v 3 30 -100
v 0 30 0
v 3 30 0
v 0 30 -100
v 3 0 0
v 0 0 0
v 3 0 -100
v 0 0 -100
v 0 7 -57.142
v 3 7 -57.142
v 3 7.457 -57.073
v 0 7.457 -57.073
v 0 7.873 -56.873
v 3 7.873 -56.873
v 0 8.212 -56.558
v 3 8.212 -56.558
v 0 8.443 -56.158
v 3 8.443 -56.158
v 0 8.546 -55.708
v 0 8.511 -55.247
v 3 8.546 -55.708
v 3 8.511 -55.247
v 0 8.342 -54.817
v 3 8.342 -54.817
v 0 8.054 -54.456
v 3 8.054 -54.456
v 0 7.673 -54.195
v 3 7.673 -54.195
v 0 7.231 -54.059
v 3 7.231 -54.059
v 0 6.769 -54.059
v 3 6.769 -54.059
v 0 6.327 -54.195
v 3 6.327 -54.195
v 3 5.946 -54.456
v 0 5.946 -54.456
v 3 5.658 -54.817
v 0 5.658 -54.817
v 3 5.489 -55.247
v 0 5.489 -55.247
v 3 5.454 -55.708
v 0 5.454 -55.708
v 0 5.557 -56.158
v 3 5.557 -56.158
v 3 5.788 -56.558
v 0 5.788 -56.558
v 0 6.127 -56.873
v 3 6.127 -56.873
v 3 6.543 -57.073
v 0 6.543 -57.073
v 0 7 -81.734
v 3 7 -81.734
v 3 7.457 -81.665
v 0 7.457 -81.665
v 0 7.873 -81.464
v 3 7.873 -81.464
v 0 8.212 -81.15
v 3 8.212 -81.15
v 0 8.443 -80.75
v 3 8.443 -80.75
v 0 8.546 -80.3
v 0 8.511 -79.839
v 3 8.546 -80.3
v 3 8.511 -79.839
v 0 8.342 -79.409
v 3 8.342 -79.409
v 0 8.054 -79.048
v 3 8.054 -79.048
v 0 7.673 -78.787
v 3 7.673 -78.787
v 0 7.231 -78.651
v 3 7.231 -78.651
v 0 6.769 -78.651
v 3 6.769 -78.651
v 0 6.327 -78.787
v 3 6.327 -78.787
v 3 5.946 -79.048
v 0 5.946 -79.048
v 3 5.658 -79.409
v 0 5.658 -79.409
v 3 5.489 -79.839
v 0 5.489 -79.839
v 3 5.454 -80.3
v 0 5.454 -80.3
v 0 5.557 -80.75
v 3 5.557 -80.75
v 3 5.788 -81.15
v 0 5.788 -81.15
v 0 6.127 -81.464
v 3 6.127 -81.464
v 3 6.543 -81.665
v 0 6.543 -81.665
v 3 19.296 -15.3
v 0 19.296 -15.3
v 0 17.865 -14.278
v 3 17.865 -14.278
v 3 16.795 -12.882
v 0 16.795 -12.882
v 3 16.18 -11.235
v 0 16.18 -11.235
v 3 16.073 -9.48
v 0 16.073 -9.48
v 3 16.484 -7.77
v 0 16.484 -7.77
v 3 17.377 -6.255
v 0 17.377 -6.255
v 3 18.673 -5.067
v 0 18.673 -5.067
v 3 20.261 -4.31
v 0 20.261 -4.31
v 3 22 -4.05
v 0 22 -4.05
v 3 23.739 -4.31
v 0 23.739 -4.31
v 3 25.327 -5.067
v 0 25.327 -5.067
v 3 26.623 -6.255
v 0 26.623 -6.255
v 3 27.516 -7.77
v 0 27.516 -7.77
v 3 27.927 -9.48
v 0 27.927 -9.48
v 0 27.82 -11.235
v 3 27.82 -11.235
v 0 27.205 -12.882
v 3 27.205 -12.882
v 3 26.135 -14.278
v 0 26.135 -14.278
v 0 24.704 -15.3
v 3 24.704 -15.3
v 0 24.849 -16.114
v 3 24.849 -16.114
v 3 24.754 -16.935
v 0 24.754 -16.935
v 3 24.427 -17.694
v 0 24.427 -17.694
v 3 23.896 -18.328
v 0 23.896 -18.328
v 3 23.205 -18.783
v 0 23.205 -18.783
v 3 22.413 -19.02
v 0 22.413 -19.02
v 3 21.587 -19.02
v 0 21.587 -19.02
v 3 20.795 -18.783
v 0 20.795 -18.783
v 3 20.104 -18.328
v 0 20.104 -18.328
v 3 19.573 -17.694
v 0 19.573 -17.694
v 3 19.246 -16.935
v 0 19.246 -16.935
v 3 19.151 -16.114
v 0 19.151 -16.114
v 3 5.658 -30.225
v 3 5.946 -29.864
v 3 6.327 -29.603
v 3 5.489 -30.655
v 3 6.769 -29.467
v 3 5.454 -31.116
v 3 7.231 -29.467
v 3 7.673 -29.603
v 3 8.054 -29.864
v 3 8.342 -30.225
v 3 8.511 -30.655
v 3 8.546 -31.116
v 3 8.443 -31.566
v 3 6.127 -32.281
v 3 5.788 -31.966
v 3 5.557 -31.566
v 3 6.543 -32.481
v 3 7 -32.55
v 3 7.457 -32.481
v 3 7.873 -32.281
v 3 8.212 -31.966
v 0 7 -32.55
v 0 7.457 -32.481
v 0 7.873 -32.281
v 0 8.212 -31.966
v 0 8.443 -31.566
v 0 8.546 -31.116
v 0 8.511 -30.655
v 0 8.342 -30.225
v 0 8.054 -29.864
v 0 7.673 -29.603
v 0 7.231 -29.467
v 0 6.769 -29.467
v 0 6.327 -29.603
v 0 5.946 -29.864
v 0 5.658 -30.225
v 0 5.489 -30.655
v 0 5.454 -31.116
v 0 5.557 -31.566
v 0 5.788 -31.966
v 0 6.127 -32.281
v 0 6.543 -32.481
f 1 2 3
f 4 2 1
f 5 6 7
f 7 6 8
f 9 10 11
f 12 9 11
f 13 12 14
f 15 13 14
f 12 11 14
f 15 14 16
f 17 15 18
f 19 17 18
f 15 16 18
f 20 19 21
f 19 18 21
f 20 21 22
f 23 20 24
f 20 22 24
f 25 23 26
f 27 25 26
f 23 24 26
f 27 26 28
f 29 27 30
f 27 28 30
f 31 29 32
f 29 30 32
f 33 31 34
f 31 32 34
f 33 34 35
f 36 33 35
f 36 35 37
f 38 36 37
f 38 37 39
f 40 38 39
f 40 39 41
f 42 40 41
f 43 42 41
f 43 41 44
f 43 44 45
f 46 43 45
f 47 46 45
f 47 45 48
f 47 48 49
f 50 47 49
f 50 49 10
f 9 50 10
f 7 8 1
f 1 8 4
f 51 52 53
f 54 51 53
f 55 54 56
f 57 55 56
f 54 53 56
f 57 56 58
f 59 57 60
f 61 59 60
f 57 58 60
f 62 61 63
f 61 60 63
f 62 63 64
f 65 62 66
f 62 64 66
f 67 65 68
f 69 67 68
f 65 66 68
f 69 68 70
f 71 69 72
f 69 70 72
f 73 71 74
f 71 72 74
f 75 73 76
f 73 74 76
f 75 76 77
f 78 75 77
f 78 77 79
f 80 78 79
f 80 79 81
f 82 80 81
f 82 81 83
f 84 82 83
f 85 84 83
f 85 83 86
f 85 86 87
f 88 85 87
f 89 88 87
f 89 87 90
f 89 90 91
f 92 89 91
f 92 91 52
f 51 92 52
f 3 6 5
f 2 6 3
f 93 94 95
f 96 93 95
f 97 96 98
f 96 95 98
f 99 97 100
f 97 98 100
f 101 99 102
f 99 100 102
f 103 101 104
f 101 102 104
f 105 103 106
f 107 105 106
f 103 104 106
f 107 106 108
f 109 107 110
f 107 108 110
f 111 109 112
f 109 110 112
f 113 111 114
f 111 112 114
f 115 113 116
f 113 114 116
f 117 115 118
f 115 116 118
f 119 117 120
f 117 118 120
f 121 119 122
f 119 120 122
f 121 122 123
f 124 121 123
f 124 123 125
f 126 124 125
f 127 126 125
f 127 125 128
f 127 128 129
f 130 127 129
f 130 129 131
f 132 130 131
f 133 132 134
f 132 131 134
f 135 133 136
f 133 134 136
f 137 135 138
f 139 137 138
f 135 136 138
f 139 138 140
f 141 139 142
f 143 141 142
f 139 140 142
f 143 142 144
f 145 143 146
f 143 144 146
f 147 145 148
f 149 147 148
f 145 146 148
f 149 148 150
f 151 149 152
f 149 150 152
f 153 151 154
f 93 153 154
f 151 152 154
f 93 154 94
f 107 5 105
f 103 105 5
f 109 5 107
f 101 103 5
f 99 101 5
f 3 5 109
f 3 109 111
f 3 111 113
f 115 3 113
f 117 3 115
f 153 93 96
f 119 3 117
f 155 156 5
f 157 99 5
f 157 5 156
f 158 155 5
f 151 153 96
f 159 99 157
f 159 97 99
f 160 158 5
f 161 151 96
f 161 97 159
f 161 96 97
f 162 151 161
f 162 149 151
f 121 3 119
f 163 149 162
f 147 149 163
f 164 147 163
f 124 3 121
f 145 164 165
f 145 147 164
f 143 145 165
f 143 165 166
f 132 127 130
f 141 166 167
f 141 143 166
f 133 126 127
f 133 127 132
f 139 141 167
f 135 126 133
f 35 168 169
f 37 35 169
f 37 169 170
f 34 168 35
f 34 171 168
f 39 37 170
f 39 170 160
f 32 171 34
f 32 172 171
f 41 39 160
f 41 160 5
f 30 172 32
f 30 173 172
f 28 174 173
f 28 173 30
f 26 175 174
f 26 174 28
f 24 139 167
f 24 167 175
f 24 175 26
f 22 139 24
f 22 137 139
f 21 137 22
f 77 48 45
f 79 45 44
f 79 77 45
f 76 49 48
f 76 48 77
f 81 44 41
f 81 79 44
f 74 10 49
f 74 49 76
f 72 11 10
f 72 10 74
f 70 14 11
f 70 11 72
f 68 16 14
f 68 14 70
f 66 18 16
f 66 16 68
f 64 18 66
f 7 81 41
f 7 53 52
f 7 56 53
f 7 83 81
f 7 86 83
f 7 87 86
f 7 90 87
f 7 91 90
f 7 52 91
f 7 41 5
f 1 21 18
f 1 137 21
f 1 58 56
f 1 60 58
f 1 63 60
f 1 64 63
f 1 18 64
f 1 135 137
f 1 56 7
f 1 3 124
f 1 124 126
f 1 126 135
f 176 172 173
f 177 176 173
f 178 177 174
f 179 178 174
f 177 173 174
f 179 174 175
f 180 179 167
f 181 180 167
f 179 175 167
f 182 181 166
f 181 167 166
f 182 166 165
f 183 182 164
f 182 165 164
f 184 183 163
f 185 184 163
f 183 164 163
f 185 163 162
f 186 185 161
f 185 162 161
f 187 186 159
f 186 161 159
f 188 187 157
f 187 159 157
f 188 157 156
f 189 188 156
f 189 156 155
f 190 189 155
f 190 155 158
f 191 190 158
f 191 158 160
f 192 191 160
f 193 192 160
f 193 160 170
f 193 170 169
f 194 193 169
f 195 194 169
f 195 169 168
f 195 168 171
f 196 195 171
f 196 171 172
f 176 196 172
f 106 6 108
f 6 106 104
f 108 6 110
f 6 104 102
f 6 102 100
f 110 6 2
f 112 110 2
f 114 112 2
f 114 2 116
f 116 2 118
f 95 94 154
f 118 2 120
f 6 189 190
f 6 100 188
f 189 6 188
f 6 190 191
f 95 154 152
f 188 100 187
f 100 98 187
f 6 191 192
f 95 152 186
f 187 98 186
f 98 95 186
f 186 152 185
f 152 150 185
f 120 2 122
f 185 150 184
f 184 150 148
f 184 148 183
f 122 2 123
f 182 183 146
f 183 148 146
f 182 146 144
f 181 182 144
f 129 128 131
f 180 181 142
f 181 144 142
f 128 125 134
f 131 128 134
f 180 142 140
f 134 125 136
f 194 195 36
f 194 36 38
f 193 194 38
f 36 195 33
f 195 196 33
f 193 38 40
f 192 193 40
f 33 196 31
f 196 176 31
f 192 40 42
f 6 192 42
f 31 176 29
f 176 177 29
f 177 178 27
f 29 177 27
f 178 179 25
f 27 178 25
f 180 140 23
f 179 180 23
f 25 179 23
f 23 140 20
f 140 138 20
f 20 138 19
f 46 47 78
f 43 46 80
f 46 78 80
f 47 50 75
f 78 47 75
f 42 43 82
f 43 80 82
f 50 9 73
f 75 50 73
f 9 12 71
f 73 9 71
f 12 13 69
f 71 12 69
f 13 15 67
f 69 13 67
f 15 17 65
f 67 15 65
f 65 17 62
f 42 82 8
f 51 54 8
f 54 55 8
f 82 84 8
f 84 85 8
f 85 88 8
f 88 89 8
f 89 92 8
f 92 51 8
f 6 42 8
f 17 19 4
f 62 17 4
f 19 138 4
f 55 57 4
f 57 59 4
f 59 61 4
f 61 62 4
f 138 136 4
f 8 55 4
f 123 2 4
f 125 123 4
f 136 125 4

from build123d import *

# Parameters (mm, degrees)
SKIZZE1_W                       = 100
SKIZZE1_H                       = 30
AUFSATZ_LINEAR_AUSTRAGEN1_DEPTH = 3
SKIZZE2_R                       = 1.55
BOHRUNGEN_DEPTH                 = 105.446158378
SCHNITT_LINEAR_AUSTRAGEN3_DEPTH = 3


with BuildPart() as part:
    # Skizze1 → Aufsatz-Linear austragen1 (new body)
    with BuildSketch(Plane(origin=(0, 0, 0), x_dir=(0, 0, -1), z_dir=(1, 0, 0))):
        with Locations((50, 15)):
            Rectangle(SKIZZE1_W, SKIZZE1_H)
    extrude(amount=AUFSATZ_LINEAR_AUSTRAGEN1_DEPTH)

    # Skizze2 → Bohrungen (cut, through all)
    with BuildSketch(Plane(origin=(3, 0, 0), x_dir=(0, 0, -1), z_dir=(1, 0, 0))):
        with Locations((10, 22)):
            Circle(SKIZZE2_R)
        with Locations((31, 7)):
            Circle(SKIZZE2_R)
        with Locations((55.59187467, 7)):
            Circle(SKIZZE2_R)
        with Locations((80.183749339, 7)):
            Circle(SKIZZE2_R)
    extrude(amount=-BOHRUNGEN_DEPTH, mode=Mode.SUBTRACT)

    # Skizze6 → Schnitt-Linear austragen3 (cut)
    with BuildSketch(Plane.ZY):
        with BuildLine():
            ThreePointArc((-15.3, 19.295836543), (-4.05, 22), (-15.3, 24.704163457))
            ThreePointArc((-15.3, 24.704163457), (-19.05, 22), (-15.3, 19.295836543))
        make_face()
    extrude(amount=-SCHNITT_LINEAR_AUSTRAGEN3_DEPTH, mode=Mode.SUBTRACT)


solid = part.part
